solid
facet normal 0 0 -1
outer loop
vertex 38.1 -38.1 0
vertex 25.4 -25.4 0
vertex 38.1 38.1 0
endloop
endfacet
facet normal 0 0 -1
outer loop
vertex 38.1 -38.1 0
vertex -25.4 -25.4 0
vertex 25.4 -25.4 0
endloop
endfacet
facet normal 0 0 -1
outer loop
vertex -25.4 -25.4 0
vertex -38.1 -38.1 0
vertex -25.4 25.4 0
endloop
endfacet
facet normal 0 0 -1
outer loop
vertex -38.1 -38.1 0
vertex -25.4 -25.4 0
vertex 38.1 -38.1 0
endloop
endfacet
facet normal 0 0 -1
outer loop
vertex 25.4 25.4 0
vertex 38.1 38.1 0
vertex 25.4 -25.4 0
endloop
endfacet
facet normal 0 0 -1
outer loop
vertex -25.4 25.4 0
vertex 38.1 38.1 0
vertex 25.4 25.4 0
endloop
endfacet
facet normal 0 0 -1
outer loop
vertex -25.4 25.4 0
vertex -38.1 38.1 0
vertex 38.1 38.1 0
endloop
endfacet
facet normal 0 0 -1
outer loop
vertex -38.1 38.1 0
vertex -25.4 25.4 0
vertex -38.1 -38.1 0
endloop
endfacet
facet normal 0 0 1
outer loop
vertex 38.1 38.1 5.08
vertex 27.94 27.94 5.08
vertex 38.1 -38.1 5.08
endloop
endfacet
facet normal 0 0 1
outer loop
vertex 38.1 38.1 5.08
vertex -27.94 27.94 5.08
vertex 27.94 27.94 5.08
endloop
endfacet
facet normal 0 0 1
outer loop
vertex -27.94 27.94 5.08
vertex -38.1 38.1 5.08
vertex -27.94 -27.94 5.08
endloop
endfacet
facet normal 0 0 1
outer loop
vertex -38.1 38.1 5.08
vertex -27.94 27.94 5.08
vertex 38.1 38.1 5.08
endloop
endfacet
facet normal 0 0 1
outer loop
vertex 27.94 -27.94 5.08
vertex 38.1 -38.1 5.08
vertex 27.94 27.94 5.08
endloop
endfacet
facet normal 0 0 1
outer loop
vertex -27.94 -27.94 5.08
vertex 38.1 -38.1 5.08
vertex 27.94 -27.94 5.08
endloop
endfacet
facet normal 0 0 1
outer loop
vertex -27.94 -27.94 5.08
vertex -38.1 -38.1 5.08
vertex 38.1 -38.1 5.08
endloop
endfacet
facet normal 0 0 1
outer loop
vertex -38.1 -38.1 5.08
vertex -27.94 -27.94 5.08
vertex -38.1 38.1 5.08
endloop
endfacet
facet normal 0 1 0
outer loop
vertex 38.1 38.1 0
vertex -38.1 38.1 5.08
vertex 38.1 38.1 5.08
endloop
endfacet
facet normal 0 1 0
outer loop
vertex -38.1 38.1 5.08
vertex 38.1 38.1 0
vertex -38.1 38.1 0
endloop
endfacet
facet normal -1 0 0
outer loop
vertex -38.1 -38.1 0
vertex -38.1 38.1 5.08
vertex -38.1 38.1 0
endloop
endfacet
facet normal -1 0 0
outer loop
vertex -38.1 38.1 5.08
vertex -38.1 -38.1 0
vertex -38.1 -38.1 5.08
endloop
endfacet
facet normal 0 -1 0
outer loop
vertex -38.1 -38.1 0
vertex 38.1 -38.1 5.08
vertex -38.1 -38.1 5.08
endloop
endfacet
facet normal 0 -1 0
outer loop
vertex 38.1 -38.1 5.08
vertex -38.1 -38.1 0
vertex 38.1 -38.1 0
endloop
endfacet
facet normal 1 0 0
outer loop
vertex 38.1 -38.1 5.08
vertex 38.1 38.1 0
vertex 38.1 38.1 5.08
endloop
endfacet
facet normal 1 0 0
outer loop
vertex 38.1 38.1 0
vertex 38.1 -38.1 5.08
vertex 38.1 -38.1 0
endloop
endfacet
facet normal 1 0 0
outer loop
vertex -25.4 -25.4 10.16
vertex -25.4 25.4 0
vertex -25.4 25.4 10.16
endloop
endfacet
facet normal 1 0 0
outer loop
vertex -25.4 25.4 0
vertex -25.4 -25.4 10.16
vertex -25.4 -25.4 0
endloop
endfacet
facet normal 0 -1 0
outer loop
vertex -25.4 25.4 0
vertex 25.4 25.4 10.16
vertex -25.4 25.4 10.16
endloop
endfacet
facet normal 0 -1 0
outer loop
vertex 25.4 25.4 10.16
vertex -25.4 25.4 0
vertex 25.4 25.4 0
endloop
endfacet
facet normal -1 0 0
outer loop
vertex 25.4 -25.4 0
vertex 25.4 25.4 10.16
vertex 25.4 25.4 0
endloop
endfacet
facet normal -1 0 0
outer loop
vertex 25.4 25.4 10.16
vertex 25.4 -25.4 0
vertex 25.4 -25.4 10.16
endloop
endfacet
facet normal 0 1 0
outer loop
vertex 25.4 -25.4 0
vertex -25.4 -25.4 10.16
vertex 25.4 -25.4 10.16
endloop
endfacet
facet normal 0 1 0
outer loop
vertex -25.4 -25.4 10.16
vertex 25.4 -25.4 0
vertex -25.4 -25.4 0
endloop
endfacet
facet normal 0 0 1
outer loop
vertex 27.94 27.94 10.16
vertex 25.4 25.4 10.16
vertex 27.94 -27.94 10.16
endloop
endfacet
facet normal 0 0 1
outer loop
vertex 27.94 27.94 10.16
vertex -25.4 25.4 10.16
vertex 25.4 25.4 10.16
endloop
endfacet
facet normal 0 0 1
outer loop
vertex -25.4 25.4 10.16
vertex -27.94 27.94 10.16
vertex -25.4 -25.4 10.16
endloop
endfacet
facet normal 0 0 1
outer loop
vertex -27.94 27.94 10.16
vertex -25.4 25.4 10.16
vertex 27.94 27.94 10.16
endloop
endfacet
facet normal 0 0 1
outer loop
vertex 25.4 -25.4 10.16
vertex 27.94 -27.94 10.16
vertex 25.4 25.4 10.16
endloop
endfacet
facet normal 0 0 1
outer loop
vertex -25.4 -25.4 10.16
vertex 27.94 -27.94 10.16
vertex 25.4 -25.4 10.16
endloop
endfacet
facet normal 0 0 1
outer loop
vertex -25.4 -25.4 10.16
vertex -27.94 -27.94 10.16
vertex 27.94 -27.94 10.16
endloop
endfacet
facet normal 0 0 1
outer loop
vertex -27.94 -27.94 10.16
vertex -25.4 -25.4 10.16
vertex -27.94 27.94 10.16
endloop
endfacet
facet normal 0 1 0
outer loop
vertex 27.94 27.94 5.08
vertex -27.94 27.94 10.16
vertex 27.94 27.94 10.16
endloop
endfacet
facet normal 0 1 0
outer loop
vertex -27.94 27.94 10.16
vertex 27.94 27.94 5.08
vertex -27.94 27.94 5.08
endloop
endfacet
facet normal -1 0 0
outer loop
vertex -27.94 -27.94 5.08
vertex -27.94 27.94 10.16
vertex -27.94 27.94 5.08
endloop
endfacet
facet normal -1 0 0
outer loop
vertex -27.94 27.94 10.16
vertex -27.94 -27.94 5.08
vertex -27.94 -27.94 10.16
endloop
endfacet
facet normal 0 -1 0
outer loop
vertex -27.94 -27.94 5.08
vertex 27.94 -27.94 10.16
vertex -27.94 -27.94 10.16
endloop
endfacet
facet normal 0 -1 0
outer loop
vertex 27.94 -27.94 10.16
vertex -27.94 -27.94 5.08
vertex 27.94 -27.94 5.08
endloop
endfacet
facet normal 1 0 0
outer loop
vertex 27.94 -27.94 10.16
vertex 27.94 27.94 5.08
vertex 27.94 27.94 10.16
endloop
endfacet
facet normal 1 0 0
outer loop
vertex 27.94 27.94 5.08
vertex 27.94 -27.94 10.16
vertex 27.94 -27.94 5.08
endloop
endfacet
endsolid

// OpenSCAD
ViewScale = [0.0254, 0.0254, 0.0254];

module surround()
{
    difference() 
    {
        square(3000, center=true);
        square(2000, center=true);
    }
}

module brace()
{
    difference() 
    {
        square(2200, center=true);
        square(2000, center=true);
    }
}


scale(ViewScale)
{
    linear_extrude(200)
    surround();

    translate([0, 0, 200])
    linear_extrude(200)
    brace();
}
